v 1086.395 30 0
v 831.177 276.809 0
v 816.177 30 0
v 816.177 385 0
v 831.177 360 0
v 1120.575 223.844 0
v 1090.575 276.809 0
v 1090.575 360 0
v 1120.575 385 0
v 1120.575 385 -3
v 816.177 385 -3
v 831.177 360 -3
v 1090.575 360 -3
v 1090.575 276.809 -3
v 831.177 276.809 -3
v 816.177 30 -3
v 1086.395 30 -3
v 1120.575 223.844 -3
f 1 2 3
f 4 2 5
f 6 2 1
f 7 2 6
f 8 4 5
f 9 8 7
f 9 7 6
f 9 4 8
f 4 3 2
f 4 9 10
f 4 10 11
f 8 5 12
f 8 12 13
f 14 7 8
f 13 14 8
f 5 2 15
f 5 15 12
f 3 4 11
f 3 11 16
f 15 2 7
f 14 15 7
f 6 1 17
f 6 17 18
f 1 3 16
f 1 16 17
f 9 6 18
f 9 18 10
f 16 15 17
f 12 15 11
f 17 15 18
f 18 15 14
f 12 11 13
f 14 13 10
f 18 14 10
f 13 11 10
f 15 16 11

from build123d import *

# Parameters (mm, degrees)
SKETCH1_W           = 259.398086837
SKETCH1_H           = 83.19083402
BOSS_EXTRUDE1_DEPTH = 3


with BuildPart() as part:
    # Sketch1 → Boss-Extrude1 (new body)
    with BuildSketch(Plane.XY):
        Polygon((816.17673453, 30), (1086.394904374, 30), (1120.574821367, 223.843941842), (1120.574821367, 385), (816.17673453, 385), align=None)
        with Locations((960.875777949, 318.40458299)):
            Rectangle(SKETCH1_W, SKETCH1_H, mode=Mode.SUBTRACT)
    extrude(amount=-BOSS_EXTRUDE1_DEPTH)


solid = part.part
